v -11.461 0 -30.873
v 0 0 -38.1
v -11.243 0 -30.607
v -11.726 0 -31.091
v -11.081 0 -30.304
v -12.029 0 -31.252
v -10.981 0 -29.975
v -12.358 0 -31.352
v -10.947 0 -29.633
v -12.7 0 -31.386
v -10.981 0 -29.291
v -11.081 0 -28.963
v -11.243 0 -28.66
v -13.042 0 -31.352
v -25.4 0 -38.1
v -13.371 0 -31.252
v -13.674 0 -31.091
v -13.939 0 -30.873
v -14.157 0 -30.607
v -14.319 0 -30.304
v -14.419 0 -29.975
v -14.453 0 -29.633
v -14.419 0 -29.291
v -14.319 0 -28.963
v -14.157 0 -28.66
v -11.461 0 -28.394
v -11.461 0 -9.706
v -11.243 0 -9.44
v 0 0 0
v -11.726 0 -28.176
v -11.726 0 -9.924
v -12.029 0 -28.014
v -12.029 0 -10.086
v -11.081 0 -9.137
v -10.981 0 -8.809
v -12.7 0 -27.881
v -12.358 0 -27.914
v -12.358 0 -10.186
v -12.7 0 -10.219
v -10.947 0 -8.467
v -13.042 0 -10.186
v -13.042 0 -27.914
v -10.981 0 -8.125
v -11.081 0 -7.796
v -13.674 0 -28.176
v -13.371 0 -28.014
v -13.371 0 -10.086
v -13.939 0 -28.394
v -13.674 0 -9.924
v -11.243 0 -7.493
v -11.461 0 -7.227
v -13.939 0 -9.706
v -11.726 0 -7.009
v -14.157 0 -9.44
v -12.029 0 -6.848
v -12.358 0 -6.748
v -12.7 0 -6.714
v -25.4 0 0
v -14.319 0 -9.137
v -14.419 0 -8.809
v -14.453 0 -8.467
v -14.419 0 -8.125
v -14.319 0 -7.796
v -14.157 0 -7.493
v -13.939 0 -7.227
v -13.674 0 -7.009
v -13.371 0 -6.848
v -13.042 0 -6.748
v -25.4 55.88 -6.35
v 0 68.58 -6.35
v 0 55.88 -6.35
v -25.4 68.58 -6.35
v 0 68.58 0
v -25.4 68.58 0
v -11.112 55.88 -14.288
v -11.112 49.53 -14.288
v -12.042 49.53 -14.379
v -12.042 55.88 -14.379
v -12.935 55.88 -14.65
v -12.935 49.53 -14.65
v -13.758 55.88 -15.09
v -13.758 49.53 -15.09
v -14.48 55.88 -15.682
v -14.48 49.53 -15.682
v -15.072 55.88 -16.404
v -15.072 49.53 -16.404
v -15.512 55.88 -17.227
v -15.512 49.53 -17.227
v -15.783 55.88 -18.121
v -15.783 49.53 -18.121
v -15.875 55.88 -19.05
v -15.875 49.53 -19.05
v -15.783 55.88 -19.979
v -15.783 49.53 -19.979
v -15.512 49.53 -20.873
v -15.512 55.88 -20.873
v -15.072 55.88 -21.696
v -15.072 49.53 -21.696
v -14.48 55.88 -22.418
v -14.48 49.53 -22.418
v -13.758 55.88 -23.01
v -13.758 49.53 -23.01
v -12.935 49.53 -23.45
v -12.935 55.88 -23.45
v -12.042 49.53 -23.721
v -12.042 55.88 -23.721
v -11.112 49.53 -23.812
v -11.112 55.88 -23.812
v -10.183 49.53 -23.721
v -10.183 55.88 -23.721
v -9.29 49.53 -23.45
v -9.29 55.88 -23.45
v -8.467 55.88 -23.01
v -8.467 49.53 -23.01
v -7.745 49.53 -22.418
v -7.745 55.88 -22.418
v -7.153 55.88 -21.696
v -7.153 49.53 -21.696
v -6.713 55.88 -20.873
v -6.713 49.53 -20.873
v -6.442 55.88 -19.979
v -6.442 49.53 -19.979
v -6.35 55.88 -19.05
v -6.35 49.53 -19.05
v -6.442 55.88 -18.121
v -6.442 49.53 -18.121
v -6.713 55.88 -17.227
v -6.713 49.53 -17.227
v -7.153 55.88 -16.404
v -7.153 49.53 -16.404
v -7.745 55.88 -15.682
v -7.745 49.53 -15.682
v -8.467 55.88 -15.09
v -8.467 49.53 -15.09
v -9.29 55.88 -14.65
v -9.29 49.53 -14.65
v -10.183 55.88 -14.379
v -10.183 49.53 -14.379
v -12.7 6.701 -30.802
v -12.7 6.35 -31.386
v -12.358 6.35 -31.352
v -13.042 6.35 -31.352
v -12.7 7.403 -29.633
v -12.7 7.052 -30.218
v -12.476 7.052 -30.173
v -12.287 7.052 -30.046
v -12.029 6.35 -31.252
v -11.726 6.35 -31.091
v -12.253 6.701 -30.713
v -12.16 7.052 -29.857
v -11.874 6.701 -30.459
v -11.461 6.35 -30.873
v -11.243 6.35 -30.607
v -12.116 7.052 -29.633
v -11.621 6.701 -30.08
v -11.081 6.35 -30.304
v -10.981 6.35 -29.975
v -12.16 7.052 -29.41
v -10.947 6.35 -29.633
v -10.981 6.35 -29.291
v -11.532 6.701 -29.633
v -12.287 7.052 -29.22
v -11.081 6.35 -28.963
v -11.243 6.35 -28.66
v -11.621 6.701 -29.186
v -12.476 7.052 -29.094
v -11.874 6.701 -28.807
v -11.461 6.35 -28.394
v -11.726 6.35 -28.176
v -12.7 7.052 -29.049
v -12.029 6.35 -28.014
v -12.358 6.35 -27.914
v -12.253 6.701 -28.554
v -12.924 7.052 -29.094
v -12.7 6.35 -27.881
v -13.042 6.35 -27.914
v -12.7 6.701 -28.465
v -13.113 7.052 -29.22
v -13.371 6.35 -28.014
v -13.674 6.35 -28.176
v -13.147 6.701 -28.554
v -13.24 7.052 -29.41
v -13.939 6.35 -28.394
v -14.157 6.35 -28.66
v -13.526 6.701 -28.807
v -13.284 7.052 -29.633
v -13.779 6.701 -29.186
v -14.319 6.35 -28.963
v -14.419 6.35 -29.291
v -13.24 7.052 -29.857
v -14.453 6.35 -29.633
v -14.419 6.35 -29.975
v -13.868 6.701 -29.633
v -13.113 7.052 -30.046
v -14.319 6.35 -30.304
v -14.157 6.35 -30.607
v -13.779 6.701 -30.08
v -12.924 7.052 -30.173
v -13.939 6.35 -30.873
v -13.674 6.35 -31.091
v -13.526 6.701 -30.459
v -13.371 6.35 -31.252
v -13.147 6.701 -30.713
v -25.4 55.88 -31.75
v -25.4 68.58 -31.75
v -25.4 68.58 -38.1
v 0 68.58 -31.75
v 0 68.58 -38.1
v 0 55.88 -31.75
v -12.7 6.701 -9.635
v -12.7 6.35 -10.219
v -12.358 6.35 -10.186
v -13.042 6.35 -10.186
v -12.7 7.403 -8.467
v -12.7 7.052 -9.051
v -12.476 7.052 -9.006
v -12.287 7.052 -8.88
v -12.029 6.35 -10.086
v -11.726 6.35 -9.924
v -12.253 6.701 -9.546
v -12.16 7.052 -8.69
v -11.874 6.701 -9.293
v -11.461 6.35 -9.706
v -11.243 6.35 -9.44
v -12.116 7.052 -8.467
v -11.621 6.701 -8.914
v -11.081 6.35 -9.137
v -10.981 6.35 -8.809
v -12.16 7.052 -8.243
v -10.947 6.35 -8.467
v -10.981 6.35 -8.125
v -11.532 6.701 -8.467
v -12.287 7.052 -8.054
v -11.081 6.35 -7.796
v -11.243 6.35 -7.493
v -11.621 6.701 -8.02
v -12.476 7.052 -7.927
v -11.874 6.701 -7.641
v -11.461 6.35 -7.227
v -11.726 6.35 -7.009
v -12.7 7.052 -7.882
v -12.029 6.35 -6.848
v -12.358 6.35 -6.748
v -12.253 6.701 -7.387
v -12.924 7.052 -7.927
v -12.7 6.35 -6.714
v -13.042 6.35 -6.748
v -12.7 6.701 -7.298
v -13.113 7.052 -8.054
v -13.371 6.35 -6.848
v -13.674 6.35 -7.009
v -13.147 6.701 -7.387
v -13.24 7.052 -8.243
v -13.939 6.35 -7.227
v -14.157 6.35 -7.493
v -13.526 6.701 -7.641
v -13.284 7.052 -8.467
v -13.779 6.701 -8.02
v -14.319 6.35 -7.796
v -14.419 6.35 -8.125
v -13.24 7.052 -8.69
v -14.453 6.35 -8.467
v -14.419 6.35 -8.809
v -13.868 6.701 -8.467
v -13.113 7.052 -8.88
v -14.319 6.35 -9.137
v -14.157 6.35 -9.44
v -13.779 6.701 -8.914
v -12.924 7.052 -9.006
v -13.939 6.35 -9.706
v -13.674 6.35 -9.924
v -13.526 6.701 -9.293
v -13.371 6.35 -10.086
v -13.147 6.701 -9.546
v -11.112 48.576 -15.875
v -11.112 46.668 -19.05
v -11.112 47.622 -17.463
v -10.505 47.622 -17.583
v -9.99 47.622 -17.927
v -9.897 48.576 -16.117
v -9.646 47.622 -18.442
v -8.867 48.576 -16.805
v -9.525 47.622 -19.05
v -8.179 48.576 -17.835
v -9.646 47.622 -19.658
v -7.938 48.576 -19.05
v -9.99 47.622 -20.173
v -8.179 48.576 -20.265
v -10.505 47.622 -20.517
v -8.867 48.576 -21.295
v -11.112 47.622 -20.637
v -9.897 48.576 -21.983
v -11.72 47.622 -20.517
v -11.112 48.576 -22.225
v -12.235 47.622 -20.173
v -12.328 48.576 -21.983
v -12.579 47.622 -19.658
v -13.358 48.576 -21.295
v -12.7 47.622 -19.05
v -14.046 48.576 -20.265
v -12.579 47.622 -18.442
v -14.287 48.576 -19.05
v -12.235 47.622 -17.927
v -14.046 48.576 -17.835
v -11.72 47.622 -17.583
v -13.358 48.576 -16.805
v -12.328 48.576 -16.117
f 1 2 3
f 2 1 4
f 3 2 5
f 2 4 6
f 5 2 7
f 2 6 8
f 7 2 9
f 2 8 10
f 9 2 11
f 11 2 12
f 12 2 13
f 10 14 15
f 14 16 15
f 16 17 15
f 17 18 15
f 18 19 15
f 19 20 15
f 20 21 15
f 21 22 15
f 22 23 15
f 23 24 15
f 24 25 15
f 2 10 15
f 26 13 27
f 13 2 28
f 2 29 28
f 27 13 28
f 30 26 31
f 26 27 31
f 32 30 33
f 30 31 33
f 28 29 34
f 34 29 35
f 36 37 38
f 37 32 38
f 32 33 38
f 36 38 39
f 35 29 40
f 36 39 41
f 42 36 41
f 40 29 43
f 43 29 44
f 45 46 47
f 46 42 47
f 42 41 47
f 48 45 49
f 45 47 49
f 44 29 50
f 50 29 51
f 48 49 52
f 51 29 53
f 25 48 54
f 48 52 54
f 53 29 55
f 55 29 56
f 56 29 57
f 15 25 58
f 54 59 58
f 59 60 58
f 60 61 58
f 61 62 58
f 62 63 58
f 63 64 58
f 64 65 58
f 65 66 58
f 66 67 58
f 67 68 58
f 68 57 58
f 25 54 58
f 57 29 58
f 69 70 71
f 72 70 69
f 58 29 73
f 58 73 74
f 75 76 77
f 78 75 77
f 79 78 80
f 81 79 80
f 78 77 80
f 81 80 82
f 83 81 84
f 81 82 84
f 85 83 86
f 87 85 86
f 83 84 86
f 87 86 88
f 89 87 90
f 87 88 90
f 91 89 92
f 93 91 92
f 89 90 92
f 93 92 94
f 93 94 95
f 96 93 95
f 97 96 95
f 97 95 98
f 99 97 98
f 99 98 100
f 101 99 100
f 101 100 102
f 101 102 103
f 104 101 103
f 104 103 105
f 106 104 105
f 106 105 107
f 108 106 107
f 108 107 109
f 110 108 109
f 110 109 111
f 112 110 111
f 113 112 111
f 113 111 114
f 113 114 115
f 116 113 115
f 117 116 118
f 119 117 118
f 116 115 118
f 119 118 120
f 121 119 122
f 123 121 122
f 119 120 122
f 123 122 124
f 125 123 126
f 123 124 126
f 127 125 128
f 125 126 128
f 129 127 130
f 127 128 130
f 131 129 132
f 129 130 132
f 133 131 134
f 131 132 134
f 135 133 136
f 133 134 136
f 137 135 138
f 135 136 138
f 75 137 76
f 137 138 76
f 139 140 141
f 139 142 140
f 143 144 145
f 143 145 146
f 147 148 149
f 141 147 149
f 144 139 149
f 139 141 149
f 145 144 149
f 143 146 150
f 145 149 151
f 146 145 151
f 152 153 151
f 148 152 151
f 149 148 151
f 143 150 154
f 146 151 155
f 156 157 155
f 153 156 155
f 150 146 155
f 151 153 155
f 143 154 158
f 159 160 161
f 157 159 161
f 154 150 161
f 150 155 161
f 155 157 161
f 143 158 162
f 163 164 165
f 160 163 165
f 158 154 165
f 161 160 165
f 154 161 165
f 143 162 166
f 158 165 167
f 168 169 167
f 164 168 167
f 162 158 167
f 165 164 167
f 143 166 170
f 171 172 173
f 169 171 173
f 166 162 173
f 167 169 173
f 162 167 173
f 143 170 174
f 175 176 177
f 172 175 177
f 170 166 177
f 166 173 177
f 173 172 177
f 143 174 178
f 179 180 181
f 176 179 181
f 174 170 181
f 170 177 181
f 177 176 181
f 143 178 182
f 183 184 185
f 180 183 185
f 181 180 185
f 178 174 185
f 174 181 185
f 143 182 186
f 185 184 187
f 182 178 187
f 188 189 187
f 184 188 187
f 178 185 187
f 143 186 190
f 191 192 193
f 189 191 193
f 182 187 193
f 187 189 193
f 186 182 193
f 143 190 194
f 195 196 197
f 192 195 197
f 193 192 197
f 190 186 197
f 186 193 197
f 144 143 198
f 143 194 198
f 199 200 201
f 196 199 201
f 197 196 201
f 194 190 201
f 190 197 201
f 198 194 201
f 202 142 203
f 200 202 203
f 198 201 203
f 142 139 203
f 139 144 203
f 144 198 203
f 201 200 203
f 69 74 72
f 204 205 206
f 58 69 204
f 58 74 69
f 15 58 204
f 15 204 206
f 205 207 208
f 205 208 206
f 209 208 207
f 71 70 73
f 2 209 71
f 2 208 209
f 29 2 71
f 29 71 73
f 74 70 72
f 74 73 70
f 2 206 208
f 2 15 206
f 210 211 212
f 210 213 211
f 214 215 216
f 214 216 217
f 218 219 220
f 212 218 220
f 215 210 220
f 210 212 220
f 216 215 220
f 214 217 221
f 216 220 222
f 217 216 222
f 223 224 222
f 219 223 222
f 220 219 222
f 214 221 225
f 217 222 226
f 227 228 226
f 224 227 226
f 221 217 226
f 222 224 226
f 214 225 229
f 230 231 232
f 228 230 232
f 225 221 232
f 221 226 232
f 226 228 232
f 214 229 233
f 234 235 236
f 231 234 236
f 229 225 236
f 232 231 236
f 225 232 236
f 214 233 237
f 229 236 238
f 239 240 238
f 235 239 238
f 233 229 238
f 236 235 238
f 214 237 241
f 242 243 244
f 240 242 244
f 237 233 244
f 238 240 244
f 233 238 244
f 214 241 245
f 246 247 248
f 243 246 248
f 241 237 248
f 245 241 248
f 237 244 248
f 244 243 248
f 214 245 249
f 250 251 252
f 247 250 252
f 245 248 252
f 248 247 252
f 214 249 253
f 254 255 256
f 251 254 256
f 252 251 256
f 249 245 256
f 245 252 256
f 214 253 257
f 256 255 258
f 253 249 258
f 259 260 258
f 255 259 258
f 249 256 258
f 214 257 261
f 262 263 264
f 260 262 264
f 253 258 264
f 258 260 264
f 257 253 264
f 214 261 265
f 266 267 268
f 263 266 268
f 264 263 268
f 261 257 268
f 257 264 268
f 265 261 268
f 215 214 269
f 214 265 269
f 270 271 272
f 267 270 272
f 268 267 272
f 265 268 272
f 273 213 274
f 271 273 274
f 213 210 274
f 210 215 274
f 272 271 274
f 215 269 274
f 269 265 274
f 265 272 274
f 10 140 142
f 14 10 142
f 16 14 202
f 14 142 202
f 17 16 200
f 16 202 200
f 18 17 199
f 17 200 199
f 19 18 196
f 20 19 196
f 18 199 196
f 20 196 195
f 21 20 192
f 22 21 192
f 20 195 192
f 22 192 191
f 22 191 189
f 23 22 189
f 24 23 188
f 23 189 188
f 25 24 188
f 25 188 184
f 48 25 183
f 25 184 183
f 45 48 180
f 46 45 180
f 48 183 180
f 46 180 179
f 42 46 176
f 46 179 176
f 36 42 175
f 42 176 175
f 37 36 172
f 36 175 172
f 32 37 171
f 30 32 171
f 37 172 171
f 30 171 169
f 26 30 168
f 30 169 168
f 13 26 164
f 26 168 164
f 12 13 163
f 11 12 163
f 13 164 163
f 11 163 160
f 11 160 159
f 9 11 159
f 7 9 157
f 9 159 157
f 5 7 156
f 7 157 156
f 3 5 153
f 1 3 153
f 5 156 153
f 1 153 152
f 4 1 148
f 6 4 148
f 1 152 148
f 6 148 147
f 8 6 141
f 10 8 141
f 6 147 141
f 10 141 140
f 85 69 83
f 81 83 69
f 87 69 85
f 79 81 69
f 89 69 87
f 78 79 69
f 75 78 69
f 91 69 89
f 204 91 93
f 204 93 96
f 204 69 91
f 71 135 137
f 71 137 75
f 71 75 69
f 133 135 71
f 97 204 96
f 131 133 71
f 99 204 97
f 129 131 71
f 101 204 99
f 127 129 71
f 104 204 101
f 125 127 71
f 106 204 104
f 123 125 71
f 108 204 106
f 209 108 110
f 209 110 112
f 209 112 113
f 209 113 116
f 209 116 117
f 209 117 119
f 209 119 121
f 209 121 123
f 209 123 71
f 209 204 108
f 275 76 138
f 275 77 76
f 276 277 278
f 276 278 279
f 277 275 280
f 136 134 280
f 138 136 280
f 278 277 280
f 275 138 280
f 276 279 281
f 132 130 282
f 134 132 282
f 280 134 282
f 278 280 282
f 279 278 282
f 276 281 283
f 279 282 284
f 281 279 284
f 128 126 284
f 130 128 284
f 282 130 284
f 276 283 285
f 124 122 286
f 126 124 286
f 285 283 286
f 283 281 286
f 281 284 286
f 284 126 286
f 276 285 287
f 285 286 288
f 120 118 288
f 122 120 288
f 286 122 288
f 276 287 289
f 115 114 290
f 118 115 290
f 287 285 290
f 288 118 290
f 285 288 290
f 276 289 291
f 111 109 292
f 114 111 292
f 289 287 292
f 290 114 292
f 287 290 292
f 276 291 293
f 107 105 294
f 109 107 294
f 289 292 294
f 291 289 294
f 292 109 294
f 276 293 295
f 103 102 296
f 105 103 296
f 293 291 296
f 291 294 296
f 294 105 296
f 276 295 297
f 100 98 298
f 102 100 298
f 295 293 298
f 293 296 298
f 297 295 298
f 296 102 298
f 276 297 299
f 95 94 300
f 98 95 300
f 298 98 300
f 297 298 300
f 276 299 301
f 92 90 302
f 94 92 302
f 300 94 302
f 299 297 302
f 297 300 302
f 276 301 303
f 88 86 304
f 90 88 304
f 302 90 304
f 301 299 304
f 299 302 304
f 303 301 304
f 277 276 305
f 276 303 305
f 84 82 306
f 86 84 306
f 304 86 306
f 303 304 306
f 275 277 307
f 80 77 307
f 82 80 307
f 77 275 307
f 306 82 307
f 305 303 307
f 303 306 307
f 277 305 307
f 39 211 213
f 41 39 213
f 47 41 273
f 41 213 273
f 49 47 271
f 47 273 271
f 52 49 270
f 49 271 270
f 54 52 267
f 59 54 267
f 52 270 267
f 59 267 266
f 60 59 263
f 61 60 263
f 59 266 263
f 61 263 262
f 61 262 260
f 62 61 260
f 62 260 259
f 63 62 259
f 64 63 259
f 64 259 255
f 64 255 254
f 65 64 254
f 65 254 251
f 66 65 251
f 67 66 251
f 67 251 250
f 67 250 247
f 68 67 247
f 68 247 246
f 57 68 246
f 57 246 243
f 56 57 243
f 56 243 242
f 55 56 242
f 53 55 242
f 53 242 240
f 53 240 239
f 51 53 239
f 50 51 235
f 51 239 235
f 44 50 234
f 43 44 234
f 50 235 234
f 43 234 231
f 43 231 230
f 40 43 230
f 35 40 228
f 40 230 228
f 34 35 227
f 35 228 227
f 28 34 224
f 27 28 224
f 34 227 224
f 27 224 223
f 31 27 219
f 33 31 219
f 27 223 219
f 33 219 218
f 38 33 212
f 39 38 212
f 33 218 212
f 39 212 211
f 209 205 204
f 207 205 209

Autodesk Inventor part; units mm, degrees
ref_plane "YZ Plane" through (0, 0, 0) normal (1, 0, 0) x (0, 1, 0)
ref_plane "XZ Plane" through (0, 0, 0) normal (0, 1, 0) x (-1, 0, 0)
ref_plane "XY Plane" through (0, 0, 0) normal (0, 0, 1) x (1, 0, 0)
sketch "Sketch1" plane through (0, 0, 0) normal (0, 1, 0) x (-1, 0, 0)
  line L0 (0, 0) -> (25.4, 0)
  line L1 (25.4, 0) -> (25.4, -38.1)
  line L2 (25.4, -38.1) -> (0, -38.1)
  line L3 (0, -38.1) -> (0, 0)
  dimension "d0" = 38.1
  dimension "d1" = 25.4
extrude "Extrusion1" add sketch "Sketch1" along normal blind 68.58
sketch "Sketch2" plane through (0, 68.58, 0) normal (0, 1, 0) x (1, 0, 0)
  line L0 (0, 0) -> (0, 38.1) projected
  line L1 (-25.4, 38.1) -> (-25.4, 0) projected
  line L2 (0, 6.35) -> (-25.4, 6.35)
  line L3 (-25.4, 6.35) -> (-25.4, 31.75)
  line L4 (-25.4, 31.75) -> (0, 31.75)
  line L5 (0, 31.75) -> (0, 6.35)
  line L6 (-25.4, 0) -> (0, 0) projected
  dimension "d4" = 6.35
  dimension "d5" = 25.4
extrude "Extrusion2" cut sketch "Sketch2" against normal blind 12.7 contours L2 L1 L4 L0
sketch "Sketch3" plane through (0, 55.88, 0) normal (0, 1, 0) x (1, 0, 0)
  circle A0 centre (-11.1125, 19.05) radius 6.35 projected
  point P0 (0, 0)
hole "Hole1" at (-11.1125, 55.88, -19.05) direction (0, -1, 0) diameter 9.525 depth 6.35 tip angle 118
sketch "Sketch4" plane through (0, 0, 0) normal (0, -1, 0) x (1, 0, 0)
  circle A0 centre (-11.1125, -19.05) radius 4.7625 projected
  line L0 (-25.4, 0) -> (-25.4, -38.1) projected
  line L1 (0, -38.1) -> (0, 0) projected
  line L2 (-25.4, -38.1) -> (0, -38.1) projected
  line L3 (0, 0) -> (-25.4, 0) projected
  point P0 (-12.7, -29.6333)
  point P1 (-12.7, -8.4667)
  dimension "d15" = 25.4
  dimension "d16" = 12.7
  dimension "d17" = 12.7
  dimension "d18" = 8.4667
  dimension "d19" = 8.4667
hole "Hole2" at (-12.7, 0, -29.6333) at (-12.7, 0, -8.4667) direction (0, 1, 0) diameter 3.5052 depth 6.35 tip angle 118
equation "\"d16\" = 0.5 * d15"
equation "\"d17\" = d16"
equation "\"d19\" = d18"
properties part number "TSV+Support"
